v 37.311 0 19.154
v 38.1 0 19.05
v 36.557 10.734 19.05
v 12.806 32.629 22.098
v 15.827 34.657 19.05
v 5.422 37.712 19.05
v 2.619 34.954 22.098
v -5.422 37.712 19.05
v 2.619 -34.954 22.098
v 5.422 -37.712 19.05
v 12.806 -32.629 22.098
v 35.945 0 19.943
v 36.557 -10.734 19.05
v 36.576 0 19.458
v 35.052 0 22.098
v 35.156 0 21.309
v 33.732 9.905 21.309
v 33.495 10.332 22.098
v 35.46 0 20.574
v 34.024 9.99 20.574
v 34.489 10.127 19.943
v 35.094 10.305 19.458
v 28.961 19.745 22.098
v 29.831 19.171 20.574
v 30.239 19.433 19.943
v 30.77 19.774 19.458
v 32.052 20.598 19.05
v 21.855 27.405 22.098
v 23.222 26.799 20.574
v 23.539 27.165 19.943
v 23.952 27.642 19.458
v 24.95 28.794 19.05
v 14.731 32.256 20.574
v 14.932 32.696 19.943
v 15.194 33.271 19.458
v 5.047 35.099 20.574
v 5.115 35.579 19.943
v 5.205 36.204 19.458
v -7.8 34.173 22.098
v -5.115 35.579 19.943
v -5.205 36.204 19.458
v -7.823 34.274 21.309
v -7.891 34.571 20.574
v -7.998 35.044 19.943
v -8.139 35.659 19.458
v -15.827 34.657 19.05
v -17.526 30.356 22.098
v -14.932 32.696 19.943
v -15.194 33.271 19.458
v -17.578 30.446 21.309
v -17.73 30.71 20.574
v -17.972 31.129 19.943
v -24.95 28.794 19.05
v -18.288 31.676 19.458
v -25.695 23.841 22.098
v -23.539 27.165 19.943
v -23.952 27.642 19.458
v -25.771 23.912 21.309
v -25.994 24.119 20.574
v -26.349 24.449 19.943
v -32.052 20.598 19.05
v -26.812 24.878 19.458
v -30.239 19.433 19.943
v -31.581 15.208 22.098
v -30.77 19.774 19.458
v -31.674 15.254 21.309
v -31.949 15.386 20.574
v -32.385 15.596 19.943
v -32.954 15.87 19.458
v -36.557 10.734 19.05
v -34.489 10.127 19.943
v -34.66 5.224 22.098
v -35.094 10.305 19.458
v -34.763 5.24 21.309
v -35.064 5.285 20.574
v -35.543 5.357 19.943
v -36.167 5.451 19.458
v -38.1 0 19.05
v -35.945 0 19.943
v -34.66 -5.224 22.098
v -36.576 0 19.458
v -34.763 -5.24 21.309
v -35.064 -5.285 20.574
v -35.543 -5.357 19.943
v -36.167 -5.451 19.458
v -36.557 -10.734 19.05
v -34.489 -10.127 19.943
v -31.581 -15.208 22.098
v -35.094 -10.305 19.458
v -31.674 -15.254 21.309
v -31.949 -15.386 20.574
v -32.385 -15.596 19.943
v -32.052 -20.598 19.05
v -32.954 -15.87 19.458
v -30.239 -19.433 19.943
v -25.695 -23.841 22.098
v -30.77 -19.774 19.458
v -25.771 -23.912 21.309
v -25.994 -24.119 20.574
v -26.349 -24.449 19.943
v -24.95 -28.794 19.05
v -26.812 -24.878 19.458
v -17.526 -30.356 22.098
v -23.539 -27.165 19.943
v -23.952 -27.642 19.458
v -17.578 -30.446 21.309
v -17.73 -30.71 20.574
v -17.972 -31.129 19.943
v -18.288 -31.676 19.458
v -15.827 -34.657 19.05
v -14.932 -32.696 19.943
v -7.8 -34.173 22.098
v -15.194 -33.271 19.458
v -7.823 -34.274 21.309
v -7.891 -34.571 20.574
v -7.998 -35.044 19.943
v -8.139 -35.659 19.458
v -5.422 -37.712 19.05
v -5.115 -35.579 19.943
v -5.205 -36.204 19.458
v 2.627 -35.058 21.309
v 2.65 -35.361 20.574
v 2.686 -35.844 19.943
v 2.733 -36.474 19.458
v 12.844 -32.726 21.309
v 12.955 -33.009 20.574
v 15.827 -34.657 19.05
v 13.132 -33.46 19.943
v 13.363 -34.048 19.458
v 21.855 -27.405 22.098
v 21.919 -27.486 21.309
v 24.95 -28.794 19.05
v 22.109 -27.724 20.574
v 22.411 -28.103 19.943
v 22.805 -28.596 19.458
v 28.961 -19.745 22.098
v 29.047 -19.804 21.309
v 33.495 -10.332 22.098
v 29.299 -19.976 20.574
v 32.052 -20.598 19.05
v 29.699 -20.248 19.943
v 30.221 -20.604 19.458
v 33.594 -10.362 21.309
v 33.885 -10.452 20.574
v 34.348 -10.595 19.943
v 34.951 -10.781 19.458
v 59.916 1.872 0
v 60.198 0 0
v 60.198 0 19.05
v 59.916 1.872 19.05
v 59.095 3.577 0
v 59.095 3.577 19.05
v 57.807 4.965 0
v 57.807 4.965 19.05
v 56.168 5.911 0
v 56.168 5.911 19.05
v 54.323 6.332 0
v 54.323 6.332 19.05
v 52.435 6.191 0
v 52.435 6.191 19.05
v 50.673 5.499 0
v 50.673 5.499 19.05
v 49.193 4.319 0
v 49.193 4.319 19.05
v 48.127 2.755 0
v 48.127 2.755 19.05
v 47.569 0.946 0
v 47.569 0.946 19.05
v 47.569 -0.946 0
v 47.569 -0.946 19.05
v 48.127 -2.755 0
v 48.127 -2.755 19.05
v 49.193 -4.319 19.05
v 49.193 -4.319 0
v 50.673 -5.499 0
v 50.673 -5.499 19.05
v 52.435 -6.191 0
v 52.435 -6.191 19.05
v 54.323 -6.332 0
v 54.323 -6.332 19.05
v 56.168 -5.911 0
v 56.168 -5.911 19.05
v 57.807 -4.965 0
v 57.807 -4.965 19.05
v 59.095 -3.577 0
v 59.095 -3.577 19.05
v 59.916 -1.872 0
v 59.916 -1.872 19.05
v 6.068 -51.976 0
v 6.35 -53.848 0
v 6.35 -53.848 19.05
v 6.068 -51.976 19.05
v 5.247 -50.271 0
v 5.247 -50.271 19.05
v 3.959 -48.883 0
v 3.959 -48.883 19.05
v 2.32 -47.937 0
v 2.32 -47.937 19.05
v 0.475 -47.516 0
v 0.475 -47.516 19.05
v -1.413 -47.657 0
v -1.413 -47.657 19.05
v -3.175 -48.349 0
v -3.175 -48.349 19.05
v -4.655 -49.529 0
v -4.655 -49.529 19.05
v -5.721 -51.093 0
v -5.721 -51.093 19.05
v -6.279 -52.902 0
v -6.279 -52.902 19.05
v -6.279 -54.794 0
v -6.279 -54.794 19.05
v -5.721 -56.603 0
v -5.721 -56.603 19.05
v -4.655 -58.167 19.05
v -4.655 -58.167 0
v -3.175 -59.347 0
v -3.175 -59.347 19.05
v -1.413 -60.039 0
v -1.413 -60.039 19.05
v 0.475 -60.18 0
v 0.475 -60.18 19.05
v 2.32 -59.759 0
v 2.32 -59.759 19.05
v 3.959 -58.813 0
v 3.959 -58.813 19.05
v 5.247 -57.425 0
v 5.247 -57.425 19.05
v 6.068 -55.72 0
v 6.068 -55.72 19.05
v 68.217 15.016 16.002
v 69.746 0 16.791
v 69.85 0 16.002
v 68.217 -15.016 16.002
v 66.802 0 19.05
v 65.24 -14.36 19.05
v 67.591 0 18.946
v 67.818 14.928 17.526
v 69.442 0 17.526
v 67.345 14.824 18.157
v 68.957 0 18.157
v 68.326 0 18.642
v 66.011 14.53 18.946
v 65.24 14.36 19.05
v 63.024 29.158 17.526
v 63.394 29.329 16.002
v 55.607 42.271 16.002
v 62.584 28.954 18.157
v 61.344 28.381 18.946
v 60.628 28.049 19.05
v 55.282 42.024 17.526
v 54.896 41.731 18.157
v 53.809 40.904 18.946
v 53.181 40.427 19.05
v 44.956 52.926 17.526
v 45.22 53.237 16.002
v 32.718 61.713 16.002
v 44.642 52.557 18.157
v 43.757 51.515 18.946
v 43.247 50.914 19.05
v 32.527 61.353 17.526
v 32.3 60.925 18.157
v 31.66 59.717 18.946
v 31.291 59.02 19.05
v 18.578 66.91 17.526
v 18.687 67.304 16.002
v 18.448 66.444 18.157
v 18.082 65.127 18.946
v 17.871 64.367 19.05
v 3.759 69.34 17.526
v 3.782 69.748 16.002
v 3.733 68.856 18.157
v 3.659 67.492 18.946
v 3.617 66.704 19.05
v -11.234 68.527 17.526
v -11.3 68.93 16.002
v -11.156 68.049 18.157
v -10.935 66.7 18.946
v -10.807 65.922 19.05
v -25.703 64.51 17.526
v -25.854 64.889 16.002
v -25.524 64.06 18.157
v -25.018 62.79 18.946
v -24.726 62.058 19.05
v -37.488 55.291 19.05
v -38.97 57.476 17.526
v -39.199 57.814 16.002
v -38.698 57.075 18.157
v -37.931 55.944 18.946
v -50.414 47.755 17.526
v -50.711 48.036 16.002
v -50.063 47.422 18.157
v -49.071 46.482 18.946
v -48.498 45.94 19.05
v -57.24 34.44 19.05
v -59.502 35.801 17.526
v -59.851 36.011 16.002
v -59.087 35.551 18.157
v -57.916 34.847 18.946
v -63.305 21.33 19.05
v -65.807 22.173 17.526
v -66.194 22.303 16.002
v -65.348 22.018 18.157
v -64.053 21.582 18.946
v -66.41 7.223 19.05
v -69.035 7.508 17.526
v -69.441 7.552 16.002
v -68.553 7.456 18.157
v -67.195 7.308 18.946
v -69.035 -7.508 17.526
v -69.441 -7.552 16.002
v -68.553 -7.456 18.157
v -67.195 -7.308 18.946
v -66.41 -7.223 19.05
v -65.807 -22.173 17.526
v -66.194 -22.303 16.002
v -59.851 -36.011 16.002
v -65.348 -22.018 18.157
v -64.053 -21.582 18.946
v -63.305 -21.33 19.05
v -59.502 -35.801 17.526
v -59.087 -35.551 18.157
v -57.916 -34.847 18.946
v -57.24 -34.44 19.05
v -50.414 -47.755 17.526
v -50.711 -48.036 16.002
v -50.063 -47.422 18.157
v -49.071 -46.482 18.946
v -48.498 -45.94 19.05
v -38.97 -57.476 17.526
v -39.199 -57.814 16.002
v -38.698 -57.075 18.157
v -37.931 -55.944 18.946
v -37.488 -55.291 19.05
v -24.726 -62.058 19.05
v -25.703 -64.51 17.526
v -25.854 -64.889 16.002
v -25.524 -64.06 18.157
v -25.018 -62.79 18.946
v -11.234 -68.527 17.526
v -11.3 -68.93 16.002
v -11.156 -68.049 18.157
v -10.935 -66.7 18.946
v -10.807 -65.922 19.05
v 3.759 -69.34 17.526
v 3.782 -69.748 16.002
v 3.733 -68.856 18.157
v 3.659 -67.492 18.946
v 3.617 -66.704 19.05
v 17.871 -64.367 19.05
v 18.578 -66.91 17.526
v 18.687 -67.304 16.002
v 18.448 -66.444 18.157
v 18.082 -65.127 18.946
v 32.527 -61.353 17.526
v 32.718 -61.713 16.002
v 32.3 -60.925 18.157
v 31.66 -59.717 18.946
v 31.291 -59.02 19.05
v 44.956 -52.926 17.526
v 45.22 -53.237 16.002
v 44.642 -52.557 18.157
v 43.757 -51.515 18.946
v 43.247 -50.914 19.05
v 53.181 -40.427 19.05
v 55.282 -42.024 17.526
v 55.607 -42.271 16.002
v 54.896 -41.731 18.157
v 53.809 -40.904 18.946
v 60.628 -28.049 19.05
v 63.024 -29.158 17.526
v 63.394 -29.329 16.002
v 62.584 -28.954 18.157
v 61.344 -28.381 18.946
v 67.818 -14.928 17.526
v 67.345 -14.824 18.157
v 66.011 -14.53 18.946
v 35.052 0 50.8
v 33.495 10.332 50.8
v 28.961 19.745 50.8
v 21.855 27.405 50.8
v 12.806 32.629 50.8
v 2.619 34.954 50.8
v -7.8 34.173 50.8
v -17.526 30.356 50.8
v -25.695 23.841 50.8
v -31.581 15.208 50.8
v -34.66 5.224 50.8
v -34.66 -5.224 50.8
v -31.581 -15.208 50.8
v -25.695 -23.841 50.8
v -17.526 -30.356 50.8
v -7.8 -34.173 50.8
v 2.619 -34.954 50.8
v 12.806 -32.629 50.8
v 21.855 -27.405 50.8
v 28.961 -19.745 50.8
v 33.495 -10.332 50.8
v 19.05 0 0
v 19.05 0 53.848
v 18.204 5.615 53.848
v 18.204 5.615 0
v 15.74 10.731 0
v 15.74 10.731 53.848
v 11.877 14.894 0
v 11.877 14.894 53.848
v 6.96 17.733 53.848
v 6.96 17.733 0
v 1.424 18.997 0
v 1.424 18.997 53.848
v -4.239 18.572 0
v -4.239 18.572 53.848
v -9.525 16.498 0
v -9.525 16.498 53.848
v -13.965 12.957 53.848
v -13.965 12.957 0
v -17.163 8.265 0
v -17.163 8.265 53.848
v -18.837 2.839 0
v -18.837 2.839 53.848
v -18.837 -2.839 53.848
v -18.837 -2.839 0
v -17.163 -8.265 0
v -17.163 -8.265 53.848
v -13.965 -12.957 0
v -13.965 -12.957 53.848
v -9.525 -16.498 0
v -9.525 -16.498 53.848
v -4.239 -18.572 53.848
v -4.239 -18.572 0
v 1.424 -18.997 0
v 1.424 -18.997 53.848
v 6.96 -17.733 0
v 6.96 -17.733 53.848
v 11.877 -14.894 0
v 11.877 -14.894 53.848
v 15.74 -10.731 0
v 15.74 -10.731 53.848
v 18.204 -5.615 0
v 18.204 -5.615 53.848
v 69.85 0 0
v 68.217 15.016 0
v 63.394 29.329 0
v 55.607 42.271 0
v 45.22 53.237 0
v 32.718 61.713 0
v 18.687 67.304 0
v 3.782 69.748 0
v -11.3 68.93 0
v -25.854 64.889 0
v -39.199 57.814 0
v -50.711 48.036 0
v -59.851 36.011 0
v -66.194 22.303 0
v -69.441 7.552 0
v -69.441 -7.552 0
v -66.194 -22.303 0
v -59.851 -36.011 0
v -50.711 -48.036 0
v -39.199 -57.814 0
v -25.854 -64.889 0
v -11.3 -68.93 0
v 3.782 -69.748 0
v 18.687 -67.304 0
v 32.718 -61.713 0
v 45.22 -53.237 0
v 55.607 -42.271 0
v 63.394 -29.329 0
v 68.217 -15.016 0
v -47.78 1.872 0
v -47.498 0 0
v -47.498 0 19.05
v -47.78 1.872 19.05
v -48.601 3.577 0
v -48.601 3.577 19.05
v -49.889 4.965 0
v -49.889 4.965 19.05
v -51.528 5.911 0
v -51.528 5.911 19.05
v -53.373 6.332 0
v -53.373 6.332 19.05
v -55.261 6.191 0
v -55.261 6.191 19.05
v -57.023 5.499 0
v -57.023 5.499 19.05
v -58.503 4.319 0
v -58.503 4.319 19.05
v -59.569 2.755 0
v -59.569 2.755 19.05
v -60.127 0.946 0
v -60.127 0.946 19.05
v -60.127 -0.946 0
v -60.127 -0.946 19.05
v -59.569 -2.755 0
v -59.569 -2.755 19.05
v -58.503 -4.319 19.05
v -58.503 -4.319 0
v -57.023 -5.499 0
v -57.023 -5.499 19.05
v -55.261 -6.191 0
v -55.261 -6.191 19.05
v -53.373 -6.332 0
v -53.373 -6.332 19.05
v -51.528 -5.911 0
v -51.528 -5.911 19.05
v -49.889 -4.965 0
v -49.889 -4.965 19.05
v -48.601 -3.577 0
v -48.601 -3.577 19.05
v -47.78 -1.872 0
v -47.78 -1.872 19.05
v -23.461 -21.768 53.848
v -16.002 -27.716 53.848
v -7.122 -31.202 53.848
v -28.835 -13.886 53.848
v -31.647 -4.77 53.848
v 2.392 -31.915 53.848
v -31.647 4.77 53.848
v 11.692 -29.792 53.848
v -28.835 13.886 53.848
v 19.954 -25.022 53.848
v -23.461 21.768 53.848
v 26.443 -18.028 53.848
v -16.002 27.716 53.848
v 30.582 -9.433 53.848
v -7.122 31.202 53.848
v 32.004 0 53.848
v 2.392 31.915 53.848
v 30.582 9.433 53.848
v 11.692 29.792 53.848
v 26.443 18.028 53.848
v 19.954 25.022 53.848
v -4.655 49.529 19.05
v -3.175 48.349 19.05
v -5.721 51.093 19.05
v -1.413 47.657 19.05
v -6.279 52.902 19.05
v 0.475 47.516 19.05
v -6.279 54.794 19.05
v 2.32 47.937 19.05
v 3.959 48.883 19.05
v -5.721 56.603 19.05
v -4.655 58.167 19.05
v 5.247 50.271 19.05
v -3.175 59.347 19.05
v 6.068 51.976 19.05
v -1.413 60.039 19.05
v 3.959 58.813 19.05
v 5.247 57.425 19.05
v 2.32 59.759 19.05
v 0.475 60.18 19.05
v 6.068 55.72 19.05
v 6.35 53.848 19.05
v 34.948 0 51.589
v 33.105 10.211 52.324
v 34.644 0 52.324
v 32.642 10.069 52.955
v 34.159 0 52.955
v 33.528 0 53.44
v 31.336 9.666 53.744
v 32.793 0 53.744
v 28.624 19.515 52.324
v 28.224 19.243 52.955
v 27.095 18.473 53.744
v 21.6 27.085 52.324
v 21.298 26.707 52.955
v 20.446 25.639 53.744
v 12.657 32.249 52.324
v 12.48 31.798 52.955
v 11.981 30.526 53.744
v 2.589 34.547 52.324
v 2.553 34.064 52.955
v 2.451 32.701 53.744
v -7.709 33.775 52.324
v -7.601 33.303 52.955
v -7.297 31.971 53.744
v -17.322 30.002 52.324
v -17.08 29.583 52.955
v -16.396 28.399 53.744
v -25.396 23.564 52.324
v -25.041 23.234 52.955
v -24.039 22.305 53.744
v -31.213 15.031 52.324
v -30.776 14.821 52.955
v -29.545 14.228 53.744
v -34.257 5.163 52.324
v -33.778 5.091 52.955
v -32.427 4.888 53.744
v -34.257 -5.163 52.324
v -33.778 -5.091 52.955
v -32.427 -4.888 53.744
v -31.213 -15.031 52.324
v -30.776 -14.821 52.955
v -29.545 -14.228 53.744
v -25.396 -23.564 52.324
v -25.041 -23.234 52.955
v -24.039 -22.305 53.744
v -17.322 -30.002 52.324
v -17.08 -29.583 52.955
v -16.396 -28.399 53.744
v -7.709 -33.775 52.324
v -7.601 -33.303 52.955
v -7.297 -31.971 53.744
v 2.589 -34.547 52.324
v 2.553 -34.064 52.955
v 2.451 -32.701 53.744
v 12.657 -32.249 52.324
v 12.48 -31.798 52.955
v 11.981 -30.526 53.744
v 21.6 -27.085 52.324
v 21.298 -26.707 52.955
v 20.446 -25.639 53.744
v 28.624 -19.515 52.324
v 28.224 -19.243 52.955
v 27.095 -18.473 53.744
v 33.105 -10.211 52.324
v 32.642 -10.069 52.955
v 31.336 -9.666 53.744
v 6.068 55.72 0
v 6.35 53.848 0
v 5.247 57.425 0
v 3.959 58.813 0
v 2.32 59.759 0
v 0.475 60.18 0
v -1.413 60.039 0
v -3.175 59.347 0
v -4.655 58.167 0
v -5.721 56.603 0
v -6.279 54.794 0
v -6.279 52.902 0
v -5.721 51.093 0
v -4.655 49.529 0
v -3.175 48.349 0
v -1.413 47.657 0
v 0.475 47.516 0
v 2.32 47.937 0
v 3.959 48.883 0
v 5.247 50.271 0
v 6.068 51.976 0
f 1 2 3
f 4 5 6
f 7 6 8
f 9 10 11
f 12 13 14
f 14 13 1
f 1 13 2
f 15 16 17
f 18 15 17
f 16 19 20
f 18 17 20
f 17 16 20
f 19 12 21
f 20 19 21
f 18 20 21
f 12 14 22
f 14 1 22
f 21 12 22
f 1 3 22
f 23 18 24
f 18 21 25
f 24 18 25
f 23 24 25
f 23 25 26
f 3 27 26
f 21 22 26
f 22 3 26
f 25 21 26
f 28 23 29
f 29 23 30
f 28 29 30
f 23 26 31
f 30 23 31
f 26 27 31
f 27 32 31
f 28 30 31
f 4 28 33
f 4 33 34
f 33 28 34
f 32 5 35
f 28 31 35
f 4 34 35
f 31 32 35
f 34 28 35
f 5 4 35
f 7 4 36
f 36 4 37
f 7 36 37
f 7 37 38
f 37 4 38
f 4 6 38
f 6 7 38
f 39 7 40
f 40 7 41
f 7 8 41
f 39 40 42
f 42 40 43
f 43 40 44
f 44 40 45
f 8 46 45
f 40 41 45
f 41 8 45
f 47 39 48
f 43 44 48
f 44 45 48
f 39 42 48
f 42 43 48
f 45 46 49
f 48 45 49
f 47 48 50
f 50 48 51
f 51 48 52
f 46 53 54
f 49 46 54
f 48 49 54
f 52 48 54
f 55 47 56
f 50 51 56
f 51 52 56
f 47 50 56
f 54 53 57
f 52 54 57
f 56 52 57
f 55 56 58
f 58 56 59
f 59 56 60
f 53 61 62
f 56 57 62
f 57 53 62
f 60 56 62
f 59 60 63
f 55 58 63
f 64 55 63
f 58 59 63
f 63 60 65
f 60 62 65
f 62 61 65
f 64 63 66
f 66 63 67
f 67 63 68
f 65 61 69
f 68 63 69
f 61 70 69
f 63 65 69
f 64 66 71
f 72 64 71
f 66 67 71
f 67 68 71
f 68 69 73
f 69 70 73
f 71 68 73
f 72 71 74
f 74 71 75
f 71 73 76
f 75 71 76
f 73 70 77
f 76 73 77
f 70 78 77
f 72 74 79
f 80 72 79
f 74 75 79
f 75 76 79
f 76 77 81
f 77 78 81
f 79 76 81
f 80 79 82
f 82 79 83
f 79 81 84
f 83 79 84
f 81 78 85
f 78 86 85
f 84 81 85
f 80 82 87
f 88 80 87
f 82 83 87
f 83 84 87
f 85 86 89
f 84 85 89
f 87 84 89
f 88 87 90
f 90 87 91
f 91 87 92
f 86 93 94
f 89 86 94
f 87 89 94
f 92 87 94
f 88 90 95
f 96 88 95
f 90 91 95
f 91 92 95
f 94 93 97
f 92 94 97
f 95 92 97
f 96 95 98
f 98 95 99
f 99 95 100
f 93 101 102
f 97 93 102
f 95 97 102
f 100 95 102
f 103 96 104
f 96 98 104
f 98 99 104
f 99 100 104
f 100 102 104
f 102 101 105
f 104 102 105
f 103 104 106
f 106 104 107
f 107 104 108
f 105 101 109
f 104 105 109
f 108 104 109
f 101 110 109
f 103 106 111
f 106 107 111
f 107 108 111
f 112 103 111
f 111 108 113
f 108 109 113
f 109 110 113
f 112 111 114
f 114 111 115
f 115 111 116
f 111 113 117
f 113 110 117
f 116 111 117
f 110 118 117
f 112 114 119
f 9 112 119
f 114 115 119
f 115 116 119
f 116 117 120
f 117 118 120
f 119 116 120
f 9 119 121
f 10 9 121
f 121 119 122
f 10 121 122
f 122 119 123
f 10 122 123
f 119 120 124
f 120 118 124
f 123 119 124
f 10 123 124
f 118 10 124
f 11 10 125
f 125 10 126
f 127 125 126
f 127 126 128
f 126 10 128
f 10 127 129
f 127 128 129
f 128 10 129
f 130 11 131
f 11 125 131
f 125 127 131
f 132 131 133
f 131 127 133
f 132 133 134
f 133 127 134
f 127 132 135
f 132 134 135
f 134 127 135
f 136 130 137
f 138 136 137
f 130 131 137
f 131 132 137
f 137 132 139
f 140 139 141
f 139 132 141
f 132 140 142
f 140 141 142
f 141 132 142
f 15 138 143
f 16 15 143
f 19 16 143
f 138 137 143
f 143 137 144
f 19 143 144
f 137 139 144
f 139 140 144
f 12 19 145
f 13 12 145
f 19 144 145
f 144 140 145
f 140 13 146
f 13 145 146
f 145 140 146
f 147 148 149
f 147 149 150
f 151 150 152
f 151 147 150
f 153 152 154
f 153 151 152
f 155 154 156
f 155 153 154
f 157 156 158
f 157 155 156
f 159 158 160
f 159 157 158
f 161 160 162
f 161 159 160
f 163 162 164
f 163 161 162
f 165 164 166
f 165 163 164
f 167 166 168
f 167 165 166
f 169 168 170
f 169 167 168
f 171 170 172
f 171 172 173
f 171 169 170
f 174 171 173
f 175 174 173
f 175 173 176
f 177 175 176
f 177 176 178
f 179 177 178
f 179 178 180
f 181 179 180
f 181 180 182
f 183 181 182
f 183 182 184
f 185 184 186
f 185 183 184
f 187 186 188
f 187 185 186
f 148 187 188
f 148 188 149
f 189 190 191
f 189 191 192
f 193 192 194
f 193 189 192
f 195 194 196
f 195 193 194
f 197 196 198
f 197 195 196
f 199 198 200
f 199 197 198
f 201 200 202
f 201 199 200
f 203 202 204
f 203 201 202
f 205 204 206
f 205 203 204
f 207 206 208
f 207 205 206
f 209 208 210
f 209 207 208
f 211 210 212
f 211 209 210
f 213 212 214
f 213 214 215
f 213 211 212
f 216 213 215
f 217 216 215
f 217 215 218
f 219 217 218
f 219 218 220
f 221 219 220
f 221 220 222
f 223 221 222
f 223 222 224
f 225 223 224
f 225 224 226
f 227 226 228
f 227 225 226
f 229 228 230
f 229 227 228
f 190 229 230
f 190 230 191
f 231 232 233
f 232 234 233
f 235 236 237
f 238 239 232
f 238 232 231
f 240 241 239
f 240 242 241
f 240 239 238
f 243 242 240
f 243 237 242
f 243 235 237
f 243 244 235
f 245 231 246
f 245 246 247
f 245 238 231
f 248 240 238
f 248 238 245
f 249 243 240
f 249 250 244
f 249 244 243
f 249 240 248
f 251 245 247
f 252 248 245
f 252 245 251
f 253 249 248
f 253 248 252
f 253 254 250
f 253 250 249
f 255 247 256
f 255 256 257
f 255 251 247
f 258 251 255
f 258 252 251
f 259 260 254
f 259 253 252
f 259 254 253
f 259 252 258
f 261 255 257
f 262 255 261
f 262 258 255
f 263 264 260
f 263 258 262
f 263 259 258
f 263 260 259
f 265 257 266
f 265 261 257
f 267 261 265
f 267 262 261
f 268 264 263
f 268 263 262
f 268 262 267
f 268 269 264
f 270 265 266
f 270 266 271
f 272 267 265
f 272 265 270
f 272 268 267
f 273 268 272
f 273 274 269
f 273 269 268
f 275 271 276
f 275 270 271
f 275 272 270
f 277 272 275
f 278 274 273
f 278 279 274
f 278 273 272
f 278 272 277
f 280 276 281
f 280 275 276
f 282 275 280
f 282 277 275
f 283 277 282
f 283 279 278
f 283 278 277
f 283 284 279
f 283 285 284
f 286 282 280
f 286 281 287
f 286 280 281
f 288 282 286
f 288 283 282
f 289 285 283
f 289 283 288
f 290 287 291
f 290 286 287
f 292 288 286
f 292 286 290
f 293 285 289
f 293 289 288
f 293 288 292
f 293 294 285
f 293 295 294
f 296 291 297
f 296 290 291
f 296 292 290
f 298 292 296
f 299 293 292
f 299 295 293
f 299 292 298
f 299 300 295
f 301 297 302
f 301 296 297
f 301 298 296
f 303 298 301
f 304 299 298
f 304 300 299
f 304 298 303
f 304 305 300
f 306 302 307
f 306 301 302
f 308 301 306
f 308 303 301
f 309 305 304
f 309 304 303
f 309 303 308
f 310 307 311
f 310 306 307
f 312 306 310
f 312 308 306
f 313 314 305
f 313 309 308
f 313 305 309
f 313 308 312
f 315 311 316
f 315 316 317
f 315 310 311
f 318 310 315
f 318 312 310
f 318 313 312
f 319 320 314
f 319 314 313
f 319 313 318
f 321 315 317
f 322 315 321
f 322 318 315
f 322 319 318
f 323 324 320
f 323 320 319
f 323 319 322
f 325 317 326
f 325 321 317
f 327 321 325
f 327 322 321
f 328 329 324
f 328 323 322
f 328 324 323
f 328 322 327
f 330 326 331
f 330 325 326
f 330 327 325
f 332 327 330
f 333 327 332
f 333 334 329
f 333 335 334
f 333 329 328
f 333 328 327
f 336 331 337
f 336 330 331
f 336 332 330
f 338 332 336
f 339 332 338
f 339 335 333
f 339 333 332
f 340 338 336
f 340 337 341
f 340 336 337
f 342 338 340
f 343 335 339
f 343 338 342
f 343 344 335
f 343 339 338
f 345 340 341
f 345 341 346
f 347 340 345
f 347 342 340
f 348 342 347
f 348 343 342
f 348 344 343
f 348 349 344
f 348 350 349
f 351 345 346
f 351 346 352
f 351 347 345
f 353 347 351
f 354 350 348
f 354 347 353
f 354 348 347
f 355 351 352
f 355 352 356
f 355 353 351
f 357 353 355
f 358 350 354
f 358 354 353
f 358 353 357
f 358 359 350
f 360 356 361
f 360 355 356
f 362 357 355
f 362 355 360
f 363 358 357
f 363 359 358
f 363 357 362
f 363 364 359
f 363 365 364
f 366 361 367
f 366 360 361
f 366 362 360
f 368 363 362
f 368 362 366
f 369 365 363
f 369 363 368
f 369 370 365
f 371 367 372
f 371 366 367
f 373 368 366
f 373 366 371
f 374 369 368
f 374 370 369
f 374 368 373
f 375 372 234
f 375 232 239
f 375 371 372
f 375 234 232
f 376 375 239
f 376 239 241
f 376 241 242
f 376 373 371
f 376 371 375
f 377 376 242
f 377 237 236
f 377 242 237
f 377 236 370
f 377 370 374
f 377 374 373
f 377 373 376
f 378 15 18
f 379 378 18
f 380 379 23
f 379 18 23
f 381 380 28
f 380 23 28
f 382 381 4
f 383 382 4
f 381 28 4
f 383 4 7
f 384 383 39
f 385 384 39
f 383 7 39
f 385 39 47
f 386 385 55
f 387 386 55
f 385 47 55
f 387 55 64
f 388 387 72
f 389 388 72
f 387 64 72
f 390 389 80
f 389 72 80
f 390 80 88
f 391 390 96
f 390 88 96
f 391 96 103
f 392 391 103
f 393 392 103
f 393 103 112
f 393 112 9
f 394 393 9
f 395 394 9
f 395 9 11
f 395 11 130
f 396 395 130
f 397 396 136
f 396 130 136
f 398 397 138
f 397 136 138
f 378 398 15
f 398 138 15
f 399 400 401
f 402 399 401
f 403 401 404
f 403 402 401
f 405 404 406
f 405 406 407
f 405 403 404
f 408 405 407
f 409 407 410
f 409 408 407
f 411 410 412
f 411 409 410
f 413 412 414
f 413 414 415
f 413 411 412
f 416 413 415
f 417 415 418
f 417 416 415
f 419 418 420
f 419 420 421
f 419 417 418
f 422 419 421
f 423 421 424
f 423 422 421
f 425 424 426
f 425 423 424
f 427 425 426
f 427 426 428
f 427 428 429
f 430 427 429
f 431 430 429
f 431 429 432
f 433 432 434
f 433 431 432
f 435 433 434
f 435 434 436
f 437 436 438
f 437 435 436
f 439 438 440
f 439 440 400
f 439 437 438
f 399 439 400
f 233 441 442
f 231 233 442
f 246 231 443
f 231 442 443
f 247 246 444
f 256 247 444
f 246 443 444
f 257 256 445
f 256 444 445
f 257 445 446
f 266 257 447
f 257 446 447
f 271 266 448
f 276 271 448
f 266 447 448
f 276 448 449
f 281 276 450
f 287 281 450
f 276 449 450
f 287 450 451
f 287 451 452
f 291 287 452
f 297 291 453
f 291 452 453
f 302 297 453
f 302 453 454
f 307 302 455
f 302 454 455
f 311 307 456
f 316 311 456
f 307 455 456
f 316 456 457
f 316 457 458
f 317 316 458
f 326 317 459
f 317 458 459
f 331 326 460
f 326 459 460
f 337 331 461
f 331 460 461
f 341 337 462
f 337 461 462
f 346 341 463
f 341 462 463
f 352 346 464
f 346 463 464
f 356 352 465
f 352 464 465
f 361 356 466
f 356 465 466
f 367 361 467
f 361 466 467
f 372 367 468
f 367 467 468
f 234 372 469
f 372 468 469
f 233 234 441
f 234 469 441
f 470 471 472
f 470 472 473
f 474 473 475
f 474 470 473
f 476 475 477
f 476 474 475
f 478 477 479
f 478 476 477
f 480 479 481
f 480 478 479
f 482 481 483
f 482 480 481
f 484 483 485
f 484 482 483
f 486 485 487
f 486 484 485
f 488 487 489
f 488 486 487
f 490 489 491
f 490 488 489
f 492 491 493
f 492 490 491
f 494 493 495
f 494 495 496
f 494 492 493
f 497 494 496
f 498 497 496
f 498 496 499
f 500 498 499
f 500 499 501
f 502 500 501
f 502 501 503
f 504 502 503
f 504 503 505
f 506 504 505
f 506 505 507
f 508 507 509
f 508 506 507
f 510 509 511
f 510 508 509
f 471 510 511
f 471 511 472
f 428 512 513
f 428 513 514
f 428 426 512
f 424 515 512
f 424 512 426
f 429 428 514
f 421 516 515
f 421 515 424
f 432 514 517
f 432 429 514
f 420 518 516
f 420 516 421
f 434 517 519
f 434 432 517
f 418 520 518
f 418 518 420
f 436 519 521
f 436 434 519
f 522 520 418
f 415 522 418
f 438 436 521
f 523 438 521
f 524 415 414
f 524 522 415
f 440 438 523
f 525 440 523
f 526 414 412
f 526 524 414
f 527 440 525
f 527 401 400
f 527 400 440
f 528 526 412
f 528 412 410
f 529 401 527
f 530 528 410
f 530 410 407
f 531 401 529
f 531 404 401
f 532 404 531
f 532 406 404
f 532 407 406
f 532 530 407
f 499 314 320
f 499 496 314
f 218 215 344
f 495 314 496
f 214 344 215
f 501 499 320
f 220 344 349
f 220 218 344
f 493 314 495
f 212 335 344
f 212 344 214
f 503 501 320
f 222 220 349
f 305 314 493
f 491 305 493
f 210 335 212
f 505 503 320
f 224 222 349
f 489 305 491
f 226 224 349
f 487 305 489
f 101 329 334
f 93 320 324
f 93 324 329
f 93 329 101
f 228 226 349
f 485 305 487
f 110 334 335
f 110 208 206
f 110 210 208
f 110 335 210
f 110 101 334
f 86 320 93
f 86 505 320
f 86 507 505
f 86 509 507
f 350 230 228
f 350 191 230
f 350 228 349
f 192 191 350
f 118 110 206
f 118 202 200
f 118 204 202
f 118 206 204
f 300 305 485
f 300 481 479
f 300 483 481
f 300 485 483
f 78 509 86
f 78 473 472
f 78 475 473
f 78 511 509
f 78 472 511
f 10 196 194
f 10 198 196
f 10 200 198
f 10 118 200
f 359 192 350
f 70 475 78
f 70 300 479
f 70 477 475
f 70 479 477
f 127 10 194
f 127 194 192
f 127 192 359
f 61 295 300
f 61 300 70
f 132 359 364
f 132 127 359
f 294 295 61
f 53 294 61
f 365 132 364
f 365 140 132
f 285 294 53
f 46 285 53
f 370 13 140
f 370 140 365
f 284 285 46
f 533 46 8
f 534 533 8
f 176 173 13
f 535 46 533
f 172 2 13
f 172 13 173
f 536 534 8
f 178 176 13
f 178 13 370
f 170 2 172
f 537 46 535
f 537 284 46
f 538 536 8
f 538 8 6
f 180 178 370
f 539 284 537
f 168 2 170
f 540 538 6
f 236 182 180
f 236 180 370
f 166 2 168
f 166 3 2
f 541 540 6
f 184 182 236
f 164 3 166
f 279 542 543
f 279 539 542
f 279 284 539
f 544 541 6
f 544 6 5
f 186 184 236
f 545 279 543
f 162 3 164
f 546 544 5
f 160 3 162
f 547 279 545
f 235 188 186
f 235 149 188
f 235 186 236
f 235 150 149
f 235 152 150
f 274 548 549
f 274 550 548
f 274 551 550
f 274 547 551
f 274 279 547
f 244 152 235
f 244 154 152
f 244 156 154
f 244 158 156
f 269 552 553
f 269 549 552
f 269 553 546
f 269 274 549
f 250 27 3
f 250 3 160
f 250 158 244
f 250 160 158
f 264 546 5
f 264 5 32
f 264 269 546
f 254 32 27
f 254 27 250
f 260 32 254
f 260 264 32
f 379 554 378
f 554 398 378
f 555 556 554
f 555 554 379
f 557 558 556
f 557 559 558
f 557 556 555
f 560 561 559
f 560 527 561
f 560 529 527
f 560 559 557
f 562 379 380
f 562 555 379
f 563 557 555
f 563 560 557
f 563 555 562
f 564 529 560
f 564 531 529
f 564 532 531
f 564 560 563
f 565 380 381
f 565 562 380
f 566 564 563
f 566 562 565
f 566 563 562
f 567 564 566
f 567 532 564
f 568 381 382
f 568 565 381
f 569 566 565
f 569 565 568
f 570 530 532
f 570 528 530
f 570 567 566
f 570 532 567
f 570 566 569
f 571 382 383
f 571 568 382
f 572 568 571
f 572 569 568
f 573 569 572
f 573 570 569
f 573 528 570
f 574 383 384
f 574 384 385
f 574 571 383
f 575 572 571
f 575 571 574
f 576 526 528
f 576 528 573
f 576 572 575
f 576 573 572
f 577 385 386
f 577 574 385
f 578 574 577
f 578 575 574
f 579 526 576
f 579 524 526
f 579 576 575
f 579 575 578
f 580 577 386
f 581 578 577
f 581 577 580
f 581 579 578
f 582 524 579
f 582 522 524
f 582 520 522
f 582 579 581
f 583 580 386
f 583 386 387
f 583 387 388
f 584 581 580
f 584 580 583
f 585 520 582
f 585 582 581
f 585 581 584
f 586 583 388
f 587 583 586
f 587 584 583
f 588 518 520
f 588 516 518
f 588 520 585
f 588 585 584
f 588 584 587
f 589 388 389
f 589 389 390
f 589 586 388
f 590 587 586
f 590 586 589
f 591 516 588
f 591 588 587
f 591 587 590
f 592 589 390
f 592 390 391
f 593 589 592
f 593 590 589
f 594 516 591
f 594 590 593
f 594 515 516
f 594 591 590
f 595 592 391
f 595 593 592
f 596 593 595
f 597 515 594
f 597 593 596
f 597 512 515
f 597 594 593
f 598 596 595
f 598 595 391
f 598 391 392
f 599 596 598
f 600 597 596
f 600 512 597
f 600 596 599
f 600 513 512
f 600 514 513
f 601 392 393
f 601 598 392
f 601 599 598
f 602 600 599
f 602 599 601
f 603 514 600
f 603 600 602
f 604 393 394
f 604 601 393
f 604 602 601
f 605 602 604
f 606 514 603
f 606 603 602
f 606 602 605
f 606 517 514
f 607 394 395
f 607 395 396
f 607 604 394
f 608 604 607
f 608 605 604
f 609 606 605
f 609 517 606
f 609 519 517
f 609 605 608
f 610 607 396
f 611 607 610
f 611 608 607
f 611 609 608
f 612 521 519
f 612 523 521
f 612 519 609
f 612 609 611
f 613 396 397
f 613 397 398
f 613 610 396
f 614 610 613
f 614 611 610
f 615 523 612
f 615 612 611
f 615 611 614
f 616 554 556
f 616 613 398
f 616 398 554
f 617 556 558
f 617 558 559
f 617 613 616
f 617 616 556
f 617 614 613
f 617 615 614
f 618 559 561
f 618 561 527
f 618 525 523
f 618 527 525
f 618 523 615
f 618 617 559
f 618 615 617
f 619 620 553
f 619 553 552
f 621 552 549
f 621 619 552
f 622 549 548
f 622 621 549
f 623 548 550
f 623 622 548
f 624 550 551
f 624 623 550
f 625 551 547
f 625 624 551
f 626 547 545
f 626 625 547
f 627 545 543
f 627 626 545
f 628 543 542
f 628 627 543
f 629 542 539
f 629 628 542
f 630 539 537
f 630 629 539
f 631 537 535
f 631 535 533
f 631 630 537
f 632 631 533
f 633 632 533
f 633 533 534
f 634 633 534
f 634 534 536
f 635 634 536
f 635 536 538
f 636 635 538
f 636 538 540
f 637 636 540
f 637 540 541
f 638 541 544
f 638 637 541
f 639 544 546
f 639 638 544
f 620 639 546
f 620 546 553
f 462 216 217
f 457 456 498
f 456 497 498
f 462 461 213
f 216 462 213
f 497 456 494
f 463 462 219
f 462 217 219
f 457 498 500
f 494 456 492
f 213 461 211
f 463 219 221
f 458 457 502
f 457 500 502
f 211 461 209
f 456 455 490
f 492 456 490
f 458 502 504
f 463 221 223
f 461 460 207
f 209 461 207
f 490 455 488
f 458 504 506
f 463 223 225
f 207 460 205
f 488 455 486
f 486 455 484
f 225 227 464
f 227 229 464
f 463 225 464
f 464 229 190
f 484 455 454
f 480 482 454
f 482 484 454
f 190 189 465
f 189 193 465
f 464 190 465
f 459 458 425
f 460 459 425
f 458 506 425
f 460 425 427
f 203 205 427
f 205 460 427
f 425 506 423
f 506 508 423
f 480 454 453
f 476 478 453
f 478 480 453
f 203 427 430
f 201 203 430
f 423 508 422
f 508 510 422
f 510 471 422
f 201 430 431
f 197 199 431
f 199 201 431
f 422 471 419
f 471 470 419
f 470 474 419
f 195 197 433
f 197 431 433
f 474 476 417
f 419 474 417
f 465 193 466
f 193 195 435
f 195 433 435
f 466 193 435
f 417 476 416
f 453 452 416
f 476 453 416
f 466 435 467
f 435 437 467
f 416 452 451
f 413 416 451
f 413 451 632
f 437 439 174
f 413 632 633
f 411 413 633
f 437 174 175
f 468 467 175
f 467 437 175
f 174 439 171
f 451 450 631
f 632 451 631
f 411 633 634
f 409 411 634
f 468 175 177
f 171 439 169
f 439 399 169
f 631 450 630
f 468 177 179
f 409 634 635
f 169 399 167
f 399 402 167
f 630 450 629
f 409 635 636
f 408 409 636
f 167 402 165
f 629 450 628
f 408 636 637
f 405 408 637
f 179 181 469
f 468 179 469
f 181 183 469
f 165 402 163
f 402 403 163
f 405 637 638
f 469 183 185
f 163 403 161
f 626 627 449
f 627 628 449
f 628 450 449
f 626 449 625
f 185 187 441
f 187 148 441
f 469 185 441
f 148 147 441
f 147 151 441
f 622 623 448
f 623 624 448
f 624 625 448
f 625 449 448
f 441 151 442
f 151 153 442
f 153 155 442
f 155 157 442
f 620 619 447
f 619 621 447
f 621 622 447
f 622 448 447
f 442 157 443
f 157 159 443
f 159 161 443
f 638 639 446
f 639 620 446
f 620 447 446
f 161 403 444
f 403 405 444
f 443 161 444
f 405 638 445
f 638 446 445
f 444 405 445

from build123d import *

# Parameters (mm, degrees)
F0_R     = 69.85
F0_R_2   = 6.35
F0_R_3   = 19.05
F1_DEPTH = 19.05
F2_R     = 35.052
F2_R_2   = 19.05
F3_DEPTH = 34.798
F4_R     = 3.048


with BuildPart() as f1:
    # F0 (on Top) → F1 (new body)
    with BuildSketch(Plane.XY):
        Circle(F0_R)
        with Locations((0, -53.848)):
            Circle(F0_R_2, mode=Mode.SUBTRACT)
        with Locations((-53.848, 0)):
            Circle(F0_R_2, mode=Mode.SUBTRACT)
        Circle(F0_R_3, mode=Mode.SUBTRACT)
        with Locations((53.848, 0)):
            Circle(F0_R_2, mode=Mode.SUBTRACT)
        with Locations((0, 53.848)):
            Circle(F0_R_2, mode=Mode.SUBTRACT)
    extrude(amount=F1_DEPTH)

    # F2 (on face) → F3 (join)
    with BuildSketch(Plane.XY.offset(19.05)):
        Circle(F2_R)
        Circle(F2_R_2, mode=Mode.SUBTRACT)
    extrude(amount=F3_DEPTH)

    # F4
    f4_edges = [f1.edges().sort_by_distance(p)[0] for p in [
        (-35.052, 0, 19.05),
        (-35.052, 0, 53.848),
        (-69.85, 0, 19.05),
    ]]
    fillet(f4_edges, radius=F4_R)


solid = f1.part
